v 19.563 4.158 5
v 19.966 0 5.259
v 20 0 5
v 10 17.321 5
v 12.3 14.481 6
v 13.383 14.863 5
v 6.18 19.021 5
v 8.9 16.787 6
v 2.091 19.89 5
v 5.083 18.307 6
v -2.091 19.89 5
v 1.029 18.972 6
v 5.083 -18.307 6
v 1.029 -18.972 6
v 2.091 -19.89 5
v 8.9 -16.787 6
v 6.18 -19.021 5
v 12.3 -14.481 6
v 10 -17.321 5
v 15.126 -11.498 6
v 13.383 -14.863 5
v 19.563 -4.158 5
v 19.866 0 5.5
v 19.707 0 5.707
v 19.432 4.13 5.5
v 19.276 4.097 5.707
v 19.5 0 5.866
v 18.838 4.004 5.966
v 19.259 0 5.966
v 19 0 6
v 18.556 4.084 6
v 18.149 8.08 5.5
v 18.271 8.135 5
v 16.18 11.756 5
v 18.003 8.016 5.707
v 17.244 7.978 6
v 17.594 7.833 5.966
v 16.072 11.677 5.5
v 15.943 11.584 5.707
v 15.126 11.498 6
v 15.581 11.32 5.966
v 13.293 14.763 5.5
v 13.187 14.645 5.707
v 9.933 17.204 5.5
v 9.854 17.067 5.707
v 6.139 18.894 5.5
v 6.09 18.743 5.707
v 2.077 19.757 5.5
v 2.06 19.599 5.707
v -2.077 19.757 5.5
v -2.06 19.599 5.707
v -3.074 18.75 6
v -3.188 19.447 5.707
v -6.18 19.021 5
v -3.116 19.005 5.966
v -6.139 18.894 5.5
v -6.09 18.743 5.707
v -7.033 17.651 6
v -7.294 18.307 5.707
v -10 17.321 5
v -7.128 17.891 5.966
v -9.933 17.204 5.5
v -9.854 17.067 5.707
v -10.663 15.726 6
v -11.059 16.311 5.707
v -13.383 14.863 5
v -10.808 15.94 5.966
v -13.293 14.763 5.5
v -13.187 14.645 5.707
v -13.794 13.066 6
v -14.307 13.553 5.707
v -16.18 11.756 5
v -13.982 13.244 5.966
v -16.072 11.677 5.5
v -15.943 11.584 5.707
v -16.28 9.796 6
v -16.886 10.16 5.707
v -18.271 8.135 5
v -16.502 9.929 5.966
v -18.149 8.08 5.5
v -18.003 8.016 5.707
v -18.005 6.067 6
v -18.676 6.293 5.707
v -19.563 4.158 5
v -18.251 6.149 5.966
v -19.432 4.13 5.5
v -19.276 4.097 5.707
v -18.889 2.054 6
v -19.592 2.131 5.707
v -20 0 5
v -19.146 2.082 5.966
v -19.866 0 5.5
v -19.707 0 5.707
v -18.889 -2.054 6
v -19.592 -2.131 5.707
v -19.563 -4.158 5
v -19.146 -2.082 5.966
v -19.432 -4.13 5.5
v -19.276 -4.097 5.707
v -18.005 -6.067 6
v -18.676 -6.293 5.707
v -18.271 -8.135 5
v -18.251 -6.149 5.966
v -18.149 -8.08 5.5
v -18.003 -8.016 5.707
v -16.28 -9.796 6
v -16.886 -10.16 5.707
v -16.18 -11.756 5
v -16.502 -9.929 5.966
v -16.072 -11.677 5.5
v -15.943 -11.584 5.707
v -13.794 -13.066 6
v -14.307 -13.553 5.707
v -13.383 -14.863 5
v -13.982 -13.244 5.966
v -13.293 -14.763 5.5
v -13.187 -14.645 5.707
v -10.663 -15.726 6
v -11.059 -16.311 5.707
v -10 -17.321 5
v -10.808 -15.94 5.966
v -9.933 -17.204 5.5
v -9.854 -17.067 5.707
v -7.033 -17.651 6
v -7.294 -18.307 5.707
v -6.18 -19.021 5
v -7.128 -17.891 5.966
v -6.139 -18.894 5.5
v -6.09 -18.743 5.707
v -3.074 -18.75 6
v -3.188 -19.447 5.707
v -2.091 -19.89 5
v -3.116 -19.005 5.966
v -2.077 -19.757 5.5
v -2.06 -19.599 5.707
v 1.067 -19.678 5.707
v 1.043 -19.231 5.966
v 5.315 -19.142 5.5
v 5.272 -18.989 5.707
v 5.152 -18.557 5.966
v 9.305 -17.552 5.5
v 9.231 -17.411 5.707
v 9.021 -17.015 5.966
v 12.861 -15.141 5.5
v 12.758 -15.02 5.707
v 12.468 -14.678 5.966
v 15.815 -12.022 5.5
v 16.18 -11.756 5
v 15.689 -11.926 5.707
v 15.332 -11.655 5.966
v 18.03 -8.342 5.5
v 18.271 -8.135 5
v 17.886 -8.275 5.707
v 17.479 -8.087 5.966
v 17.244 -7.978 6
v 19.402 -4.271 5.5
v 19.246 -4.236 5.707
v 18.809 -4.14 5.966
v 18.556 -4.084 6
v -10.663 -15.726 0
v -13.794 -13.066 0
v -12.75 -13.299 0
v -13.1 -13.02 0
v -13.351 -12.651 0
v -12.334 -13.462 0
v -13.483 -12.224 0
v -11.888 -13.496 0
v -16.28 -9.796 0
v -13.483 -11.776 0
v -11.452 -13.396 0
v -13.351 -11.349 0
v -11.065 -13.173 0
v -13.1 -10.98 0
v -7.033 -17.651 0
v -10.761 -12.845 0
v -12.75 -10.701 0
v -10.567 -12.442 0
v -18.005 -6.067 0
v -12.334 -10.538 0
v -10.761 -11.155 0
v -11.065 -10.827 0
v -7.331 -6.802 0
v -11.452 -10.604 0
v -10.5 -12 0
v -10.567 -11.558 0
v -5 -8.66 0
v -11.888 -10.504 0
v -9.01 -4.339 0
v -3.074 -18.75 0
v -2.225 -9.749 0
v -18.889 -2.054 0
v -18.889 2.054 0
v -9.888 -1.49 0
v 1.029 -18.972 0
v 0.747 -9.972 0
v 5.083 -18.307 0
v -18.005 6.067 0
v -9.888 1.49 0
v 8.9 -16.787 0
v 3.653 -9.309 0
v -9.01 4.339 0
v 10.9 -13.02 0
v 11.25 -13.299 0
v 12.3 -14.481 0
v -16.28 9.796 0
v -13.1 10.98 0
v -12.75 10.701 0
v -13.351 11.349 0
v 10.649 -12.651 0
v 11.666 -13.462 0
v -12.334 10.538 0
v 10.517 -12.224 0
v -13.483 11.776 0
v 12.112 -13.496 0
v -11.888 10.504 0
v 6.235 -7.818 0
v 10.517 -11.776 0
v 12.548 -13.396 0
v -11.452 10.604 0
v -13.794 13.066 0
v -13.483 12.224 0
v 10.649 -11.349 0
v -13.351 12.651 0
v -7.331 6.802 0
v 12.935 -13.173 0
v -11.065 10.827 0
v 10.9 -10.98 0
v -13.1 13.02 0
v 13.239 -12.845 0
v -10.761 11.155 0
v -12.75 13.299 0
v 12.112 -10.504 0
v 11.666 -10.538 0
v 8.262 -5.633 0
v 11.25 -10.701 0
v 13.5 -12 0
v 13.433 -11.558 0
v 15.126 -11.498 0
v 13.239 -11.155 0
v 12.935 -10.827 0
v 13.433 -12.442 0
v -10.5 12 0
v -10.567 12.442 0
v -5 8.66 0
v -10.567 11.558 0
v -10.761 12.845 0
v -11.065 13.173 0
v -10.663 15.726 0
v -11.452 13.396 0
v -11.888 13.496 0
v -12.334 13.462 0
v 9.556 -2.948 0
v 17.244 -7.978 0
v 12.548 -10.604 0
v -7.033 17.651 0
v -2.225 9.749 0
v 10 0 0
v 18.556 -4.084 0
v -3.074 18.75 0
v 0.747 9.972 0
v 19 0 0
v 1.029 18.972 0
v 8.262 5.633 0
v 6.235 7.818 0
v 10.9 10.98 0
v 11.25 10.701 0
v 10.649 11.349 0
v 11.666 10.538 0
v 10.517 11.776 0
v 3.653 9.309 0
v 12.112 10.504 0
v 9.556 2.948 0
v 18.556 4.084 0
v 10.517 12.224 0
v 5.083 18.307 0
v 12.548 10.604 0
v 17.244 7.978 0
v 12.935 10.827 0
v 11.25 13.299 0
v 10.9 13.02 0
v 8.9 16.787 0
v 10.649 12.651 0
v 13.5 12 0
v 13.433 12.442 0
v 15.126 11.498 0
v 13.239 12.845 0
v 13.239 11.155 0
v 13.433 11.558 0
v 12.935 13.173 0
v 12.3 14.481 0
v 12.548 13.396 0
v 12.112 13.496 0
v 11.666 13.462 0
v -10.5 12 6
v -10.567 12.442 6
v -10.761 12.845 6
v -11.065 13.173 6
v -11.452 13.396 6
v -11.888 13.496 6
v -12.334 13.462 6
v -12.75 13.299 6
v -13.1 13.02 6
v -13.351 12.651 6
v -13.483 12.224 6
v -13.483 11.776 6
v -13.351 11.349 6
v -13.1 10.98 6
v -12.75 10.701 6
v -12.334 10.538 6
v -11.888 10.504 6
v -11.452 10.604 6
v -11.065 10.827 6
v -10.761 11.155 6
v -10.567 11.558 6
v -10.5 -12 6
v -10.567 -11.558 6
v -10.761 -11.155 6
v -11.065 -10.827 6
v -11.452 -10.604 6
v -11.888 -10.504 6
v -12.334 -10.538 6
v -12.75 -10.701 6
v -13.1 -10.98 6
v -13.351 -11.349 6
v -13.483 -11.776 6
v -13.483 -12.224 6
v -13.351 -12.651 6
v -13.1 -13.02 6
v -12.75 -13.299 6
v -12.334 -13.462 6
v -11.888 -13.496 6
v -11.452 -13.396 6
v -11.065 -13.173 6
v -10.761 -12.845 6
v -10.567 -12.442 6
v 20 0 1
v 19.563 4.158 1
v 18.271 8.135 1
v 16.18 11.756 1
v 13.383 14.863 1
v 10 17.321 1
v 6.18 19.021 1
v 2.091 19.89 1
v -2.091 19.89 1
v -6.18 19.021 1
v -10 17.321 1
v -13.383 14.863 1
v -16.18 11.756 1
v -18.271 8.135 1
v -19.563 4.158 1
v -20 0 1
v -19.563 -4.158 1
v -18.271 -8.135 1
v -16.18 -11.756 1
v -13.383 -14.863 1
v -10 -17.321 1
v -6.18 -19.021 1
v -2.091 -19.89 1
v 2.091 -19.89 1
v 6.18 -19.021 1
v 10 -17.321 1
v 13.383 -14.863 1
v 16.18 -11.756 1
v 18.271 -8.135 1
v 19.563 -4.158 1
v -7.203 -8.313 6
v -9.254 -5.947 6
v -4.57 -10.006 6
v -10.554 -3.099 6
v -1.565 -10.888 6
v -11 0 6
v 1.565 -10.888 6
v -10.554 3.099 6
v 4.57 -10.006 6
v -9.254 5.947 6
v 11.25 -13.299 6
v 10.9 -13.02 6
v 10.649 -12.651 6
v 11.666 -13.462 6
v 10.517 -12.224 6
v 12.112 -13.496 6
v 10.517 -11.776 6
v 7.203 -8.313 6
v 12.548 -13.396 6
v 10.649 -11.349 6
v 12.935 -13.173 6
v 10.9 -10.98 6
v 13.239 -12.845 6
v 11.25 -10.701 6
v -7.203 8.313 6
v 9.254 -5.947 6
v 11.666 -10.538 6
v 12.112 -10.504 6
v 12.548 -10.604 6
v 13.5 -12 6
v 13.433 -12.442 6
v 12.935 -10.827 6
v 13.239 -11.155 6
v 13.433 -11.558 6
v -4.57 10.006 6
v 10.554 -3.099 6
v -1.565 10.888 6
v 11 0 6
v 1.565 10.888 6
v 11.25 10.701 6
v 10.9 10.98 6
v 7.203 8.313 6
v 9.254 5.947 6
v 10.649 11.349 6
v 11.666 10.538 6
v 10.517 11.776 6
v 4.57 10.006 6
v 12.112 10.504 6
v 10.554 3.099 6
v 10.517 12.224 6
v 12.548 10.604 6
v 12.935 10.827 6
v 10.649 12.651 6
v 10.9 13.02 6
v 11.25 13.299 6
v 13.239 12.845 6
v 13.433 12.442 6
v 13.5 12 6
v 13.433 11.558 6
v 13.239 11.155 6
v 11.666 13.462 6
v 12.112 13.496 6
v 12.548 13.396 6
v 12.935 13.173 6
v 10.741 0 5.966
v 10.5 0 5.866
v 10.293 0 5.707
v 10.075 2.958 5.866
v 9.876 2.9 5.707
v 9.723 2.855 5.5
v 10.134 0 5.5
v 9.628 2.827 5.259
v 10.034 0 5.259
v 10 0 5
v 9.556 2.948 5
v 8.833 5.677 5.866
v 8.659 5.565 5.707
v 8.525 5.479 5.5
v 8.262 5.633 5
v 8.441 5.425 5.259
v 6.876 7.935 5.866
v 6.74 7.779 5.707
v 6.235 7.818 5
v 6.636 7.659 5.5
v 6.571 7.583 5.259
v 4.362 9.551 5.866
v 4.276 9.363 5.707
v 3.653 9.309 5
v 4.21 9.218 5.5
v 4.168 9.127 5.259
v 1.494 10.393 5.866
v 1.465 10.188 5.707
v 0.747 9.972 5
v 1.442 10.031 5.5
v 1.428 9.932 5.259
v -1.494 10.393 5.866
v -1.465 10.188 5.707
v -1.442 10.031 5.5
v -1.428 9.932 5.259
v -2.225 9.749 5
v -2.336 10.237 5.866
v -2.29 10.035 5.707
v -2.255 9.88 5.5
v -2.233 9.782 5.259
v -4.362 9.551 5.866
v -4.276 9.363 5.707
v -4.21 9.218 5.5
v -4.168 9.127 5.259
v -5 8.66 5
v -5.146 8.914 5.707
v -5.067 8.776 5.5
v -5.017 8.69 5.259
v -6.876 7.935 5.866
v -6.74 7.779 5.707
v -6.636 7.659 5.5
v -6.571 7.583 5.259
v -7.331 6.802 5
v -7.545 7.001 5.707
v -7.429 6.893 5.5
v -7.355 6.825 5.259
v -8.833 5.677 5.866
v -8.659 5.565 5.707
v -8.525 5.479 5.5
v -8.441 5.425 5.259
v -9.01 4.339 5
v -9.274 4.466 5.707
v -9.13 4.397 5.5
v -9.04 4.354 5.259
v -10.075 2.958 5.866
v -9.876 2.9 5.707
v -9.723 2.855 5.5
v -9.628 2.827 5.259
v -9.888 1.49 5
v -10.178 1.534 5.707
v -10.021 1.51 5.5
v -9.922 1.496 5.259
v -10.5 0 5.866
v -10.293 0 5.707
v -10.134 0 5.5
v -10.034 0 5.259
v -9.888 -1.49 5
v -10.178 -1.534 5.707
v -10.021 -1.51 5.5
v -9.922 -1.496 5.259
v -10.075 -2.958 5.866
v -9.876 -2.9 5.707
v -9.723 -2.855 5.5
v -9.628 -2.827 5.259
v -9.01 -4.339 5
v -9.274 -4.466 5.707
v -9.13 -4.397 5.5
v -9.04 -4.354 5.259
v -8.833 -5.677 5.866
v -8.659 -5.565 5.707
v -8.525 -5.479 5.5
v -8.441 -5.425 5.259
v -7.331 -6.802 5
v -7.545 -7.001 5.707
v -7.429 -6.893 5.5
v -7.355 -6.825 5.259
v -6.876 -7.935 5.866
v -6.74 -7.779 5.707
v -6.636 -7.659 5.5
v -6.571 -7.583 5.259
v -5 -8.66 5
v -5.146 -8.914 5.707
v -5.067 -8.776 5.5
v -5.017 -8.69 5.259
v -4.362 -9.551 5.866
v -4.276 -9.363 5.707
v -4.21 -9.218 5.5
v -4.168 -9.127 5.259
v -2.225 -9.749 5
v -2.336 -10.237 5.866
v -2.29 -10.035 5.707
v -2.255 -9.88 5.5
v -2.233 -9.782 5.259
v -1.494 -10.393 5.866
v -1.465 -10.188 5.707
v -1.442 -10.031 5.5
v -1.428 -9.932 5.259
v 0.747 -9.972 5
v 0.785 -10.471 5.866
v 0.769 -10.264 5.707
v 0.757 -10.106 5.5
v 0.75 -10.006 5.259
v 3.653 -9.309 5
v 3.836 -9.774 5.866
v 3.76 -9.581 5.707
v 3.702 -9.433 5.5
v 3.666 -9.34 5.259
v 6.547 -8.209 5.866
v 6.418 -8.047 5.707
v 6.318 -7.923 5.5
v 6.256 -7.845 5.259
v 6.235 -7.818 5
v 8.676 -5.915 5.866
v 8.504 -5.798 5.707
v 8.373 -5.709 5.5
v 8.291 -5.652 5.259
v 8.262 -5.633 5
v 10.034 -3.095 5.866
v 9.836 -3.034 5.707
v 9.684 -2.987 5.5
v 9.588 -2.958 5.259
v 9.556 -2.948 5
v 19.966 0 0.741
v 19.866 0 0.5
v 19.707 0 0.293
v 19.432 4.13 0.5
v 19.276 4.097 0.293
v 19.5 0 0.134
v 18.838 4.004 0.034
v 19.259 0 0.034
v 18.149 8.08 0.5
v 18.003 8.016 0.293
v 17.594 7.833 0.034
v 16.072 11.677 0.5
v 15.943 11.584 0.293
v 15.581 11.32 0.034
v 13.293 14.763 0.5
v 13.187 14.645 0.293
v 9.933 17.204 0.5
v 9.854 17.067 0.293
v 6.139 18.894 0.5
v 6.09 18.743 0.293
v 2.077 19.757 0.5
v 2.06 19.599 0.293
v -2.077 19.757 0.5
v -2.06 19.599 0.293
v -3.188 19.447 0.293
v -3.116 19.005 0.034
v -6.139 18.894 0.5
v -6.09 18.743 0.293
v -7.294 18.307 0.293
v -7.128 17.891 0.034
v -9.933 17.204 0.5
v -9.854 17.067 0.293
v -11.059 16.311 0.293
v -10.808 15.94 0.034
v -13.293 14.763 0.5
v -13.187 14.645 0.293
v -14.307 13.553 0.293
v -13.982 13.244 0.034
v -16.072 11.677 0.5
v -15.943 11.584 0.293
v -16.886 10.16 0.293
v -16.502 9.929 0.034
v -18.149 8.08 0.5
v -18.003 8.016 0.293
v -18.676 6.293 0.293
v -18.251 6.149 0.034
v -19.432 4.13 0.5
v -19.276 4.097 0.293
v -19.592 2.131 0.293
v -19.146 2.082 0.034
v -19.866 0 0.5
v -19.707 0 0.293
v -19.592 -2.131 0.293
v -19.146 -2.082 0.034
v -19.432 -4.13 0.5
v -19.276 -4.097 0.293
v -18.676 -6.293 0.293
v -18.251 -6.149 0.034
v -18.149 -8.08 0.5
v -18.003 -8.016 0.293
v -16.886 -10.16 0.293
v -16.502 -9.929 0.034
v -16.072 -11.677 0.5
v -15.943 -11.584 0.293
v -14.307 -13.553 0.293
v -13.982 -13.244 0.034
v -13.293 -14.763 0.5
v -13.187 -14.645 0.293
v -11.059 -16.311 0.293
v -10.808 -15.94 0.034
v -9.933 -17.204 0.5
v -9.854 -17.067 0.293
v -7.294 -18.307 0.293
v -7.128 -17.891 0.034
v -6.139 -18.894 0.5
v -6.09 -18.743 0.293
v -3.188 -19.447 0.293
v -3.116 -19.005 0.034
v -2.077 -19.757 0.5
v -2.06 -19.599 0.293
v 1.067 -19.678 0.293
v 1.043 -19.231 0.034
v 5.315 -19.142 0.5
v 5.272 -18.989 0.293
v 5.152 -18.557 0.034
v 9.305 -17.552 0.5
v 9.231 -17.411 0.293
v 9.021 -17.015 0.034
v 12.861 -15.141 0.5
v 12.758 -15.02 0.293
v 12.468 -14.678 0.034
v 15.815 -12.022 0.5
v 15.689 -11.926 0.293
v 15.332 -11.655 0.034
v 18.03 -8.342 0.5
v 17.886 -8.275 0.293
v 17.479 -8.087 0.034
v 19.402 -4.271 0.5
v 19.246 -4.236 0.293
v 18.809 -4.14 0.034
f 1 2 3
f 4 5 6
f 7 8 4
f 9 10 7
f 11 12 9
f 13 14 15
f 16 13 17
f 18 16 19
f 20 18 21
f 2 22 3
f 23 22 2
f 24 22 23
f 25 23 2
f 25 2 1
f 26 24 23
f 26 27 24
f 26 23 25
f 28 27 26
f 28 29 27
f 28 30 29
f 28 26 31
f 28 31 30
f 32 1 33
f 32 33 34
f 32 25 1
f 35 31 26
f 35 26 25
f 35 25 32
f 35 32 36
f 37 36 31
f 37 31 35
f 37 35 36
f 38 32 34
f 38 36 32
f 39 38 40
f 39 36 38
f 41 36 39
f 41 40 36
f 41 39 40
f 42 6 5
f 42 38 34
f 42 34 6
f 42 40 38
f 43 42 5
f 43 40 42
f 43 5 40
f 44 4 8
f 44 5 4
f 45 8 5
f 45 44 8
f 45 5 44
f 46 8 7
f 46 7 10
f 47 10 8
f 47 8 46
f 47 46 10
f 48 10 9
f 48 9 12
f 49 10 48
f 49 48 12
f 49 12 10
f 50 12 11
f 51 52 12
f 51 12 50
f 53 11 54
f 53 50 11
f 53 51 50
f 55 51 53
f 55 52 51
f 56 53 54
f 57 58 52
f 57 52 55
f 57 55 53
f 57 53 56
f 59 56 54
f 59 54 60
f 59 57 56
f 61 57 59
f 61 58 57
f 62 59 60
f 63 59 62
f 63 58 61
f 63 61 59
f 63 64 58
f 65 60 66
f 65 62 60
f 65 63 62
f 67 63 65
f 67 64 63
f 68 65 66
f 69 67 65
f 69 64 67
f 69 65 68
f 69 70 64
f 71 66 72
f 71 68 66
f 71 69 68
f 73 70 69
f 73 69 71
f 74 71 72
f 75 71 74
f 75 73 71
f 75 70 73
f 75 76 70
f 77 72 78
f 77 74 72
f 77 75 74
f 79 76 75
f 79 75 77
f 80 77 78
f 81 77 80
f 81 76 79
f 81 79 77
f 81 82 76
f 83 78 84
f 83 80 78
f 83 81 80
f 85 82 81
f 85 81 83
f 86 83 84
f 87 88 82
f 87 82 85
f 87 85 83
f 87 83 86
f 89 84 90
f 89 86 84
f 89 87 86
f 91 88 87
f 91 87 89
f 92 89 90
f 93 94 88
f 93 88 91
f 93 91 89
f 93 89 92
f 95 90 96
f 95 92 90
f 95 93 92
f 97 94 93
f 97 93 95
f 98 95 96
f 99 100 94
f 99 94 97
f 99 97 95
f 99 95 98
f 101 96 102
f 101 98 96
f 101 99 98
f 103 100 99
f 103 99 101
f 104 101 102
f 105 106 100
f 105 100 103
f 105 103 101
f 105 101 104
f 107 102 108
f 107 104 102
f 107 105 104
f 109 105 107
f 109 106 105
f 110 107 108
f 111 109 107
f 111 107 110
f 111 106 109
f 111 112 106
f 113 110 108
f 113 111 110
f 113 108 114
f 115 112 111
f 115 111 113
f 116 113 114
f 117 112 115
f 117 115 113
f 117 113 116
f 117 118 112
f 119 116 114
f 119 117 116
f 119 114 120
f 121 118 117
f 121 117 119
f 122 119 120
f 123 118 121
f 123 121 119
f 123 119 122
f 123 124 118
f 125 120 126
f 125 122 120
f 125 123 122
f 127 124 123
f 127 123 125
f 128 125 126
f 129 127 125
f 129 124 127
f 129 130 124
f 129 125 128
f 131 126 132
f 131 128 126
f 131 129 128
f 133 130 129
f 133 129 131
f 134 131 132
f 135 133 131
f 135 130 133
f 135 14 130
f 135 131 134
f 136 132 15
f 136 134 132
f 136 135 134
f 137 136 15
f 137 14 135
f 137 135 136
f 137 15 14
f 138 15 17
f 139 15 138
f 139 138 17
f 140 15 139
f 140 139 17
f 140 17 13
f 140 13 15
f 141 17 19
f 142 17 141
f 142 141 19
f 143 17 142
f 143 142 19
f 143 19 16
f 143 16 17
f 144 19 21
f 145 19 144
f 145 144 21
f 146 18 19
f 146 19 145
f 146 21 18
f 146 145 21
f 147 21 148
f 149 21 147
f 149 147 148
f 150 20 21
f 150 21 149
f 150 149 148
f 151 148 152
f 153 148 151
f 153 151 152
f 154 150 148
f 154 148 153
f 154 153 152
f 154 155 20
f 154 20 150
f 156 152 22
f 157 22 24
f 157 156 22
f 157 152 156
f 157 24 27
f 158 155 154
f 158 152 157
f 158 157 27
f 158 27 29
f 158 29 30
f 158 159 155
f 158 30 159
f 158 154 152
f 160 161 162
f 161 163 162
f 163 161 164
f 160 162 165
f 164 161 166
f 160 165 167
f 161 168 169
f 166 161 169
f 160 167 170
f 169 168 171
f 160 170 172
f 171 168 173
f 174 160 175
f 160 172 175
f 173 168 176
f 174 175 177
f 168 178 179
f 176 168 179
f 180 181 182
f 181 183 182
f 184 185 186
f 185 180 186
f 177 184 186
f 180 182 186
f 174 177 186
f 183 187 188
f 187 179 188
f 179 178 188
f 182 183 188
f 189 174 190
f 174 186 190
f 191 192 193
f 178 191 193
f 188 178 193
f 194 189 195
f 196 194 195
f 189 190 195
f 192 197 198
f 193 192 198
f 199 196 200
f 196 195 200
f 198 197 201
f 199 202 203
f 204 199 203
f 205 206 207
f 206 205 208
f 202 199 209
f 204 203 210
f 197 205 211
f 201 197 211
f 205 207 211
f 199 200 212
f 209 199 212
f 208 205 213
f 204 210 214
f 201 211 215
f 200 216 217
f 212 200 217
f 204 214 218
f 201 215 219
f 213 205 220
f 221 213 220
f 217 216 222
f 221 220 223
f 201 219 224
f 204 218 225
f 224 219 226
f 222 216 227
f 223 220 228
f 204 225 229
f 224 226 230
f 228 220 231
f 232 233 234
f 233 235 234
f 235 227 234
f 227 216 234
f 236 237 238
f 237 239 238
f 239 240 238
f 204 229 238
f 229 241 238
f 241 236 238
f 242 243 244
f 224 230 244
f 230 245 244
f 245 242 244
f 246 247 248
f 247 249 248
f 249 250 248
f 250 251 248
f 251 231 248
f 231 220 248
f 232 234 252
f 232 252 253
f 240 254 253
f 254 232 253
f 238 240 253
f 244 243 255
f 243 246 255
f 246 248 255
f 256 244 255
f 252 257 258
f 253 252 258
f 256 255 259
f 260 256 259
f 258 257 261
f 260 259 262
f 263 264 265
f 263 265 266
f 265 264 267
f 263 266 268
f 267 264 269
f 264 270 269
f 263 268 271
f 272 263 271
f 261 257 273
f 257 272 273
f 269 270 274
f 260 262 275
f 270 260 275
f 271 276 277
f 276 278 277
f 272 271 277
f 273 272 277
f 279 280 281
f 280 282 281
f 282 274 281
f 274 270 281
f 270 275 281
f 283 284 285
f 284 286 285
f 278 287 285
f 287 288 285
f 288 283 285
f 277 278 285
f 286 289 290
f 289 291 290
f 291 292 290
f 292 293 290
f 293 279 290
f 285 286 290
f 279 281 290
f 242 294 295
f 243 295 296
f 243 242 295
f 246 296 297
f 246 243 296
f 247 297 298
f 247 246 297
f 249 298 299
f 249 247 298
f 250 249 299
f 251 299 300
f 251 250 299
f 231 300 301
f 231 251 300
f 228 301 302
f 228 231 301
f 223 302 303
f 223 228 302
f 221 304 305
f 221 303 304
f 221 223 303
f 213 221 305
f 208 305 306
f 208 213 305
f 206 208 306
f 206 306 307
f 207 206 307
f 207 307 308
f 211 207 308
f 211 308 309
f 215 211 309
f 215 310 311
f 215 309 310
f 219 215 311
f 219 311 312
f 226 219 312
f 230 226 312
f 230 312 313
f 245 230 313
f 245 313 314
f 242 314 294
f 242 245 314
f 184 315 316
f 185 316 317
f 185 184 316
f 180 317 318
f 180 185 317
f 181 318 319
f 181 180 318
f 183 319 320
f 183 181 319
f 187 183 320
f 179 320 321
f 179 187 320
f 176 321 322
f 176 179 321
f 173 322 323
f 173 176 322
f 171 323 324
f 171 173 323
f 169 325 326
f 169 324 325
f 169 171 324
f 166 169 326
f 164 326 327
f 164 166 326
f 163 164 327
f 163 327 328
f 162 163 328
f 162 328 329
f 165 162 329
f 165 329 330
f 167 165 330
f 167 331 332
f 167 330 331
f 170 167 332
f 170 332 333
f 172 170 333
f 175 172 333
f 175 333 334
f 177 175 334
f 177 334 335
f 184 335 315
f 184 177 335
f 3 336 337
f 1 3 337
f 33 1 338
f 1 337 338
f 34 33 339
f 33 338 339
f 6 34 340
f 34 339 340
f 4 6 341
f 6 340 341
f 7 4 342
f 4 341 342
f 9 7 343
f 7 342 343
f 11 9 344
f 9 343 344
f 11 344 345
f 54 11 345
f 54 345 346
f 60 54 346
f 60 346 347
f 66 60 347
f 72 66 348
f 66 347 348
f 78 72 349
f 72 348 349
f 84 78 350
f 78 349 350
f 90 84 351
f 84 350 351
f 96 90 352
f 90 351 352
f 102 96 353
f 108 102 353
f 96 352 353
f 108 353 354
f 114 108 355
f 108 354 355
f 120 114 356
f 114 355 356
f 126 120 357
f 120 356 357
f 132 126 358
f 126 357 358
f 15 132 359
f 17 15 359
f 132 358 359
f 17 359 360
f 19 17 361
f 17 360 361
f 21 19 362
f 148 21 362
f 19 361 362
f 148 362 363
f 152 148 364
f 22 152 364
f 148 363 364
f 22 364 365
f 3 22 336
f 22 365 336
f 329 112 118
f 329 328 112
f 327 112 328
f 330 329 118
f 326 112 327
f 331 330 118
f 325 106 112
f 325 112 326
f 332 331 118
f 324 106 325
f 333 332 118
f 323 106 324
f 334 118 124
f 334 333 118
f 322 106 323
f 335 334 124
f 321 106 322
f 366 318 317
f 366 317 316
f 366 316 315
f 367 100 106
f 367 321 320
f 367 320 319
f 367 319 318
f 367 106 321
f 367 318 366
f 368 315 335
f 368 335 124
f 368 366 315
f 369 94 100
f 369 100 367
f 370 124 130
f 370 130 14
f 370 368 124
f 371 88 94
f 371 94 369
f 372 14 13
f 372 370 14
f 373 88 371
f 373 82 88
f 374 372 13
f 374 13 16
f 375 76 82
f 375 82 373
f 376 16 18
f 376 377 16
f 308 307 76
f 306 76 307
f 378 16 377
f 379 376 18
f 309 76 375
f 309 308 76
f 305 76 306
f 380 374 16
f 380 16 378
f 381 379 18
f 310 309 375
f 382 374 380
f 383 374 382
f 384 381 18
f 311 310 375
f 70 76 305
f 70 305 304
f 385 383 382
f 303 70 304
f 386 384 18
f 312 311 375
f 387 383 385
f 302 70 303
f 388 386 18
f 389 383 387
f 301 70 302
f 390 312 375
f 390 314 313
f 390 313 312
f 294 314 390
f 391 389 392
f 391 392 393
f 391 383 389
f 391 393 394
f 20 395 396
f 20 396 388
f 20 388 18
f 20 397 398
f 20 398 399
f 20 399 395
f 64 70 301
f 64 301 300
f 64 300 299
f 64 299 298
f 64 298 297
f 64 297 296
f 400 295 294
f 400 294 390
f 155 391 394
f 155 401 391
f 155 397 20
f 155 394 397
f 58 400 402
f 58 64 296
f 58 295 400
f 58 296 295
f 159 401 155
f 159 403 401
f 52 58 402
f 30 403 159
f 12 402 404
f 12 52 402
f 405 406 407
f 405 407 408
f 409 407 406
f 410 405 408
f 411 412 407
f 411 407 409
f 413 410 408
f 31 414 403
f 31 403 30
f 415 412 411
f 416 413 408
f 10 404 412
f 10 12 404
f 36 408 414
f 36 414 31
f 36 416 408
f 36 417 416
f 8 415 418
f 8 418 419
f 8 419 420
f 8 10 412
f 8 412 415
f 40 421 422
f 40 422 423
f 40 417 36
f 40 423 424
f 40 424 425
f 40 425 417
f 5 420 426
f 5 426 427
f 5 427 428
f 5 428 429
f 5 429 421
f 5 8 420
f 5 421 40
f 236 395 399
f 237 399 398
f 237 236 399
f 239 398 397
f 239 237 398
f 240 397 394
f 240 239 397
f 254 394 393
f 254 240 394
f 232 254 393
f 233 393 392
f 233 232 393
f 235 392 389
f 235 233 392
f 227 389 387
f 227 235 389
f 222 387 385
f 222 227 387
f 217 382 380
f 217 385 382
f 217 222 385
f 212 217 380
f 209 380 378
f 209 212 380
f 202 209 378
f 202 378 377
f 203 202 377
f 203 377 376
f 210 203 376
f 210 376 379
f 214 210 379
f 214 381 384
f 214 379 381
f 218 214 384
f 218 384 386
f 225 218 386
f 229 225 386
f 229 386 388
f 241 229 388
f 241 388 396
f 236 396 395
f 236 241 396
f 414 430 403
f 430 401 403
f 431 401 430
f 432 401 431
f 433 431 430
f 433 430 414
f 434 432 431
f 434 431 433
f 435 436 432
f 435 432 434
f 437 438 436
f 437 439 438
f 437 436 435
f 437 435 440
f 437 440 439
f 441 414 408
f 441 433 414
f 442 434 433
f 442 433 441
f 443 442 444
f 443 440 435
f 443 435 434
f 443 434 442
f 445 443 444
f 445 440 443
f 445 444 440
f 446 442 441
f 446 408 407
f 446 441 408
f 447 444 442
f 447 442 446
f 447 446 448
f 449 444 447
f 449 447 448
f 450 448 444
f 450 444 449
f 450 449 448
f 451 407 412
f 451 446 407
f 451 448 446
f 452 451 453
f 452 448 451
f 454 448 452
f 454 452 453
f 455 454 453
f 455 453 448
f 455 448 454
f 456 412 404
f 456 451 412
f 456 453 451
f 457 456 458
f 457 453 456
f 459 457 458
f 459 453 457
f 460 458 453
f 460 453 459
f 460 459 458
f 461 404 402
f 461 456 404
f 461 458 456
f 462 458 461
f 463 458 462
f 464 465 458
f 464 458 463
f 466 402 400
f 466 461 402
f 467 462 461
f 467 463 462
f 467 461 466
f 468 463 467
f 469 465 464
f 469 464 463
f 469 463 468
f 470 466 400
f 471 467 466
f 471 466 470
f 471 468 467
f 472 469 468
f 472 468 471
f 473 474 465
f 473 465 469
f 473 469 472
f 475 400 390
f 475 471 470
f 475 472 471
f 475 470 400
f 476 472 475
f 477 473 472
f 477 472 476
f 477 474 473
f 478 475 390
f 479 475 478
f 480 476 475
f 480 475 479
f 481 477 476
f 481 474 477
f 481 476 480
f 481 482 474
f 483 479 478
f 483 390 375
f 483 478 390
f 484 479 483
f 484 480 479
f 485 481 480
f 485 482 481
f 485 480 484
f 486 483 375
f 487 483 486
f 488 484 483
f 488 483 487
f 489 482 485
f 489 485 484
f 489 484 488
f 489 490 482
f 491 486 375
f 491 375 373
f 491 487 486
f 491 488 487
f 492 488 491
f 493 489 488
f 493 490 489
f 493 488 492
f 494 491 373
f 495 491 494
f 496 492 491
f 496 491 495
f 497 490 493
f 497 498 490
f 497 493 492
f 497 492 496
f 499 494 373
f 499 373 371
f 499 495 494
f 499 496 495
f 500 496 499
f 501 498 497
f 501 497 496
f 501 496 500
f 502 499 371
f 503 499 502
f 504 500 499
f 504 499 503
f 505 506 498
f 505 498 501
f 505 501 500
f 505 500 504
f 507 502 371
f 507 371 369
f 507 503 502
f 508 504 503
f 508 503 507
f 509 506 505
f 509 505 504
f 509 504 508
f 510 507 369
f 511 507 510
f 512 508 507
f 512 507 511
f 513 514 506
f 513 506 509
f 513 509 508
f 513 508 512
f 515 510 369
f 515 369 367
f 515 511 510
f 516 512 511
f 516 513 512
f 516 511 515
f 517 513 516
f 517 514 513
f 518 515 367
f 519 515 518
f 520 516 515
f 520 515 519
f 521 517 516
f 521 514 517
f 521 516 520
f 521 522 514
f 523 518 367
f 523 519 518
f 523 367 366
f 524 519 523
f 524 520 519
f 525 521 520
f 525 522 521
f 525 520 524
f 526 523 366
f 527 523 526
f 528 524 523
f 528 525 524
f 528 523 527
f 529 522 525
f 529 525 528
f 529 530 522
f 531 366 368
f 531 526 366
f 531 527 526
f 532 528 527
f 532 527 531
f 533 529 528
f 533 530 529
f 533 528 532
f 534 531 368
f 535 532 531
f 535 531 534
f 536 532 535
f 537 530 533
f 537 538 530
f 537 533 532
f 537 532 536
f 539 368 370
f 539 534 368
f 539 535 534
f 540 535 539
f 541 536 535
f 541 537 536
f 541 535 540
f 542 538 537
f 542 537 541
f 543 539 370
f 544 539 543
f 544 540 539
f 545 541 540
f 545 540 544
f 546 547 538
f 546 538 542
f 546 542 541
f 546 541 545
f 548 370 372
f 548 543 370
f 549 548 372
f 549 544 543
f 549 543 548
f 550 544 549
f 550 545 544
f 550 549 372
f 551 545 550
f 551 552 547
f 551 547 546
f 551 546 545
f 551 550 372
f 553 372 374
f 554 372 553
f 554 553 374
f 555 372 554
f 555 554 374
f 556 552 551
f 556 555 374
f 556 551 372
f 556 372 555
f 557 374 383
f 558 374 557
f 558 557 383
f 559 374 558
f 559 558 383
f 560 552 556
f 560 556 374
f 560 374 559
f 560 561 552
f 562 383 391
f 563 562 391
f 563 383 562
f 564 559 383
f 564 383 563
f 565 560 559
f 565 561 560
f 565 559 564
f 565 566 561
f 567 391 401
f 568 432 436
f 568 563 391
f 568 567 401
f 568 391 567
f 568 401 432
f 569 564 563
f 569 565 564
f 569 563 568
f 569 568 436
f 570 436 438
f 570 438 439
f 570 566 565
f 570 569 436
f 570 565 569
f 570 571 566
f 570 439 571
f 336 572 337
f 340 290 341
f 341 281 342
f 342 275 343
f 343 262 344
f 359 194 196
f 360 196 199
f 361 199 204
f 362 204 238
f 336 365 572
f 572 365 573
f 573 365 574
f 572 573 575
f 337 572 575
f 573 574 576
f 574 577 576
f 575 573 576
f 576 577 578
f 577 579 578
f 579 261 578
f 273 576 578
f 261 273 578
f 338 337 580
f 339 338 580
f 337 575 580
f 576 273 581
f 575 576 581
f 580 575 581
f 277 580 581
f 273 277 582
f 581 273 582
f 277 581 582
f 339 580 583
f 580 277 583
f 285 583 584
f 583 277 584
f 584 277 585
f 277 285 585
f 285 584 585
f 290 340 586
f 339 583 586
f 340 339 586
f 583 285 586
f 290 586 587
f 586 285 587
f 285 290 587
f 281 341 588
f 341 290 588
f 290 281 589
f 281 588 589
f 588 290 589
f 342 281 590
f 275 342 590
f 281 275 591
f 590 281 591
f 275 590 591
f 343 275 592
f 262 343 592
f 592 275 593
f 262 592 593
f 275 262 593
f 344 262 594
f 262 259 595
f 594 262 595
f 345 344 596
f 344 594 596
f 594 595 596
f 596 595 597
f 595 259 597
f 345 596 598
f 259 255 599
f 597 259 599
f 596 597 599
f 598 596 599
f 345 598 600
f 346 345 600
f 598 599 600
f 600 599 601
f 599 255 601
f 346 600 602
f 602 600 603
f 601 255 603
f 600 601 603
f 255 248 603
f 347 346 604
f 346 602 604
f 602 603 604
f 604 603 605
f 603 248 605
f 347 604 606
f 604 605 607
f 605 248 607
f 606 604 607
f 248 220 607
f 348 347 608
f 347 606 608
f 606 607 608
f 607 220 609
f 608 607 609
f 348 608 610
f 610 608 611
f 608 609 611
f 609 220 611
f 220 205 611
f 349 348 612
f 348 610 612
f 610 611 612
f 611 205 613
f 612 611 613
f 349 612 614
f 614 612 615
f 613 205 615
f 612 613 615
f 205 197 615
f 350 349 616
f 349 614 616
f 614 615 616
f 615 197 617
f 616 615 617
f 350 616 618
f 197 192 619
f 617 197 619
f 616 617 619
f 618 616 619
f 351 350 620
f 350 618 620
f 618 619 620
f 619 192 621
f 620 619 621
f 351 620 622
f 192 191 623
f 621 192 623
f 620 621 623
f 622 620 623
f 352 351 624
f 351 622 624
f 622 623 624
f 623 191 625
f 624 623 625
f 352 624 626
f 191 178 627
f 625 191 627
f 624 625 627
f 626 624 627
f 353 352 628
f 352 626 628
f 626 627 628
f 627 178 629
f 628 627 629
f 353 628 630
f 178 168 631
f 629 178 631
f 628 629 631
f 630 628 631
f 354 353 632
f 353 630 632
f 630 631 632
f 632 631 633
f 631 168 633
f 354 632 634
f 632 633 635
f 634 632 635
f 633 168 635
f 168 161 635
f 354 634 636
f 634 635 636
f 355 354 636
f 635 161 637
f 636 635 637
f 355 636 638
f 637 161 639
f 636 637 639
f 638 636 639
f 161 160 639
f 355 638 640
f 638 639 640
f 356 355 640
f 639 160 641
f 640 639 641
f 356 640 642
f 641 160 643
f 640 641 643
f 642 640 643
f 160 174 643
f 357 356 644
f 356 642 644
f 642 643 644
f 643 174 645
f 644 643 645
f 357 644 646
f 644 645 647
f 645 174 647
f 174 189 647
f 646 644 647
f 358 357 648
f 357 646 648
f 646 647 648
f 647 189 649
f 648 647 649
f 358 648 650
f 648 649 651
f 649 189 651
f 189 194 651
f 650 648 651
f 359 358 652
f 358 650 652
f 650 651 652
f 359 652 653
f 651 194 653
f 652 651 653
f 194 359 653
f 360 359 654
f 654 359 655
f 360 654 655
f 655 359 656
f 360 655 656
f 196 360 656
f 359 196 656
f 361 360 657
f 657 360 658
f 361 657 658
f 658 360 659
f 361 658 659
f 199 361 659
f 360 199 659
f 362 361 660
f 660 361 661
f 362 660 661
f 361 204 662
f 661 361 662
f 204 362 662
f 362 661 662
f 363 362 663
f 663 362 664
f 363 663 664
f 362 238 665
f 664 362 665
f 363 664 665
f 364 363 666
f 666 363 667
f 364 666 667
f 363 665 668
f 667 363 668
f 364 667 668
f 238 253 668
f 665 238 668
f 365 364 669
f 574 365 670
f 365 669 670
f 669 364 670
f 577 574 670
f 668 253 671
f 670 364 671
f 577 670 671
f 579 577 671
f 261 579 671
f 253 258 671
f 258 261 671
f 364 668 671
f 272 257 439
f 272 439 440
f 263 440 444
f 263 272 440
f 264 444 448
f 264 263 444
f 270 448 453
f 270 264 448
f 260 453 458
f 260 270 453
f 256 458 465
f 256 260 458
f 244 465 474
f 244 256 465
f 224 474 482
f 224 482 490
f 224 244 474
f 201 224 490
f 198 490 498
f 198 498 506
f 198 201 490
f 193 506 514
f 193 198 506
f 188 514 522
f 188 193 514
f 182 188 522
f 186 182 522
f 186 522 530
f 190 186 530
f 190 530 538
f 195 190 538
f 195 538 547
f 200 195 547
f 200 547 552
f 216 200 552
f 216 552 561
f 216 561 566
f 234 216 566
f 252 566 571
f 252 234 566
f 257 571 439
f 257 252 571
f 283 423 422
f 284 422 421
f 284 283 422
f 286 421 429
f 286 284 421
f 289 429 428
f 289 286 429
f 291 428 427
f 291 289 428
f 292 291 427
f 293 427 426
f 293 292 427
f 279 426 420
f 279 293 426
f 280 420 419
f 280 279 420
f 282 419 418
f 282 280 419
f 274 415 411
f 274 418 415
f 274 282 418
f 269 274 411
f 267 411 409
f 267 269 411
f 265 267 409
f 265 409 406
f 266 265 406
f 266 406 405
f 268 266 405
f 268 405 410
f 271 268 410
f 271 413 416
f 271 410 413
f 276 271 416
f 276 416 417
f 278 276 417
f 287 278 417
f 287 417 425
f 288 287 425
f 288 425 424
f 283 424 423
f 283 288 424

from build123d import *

# Parameters (mm, degrees)
CYLINDER019_R     = 1.5
CYLINDER019_DEPTH = 10
ARRAY_X_COUNT     = 2
ARRAY_X_PITCH     = 24
ARRAY_Y_COUNT     = 2
ARRAY_Y_PITCH     = 24
CYLINDER014_R     = 10
CYLINDER014_DEPTH = 6
CYLINDER018_R     = 20
CYLINDER018_DEPTH = 6
FILLET_R          = 1


with BuildPart() as bolt_hole_array:
    # Cylinder019 → Cylinder019 (new body)
    with BuildSketch(Plane.XY):
        Circle(CYLINDER019_R)
    extrude(amount=CYLINDER019_DEPTH)

    # Array X: bolt hole array ×2


with BuildPart() as bolt_hole_array_1:
    add(bolt_hole_array.part)
    with Locations(*[(i * ARRAY_X_PITCH, 0, 0) for i in range(1, ARRAY_X_COUNT)]):
        add(bolt_hole_array.part)

    # Array Y: bolt hole array ×2


with BuildPart() as bolt_hole_array_2:
    add(bolt_hole_array_1.part)
    with Locations(*[(0, i * ARRAY_Y_PITCH, 0) for i in range(1, ARRAY_Y_COUNT)]):
        add(bolt_hole_array_1.part)


with BuildPart() as bolt_hole_array_3:
    # Array placement: moved
    add(bolt_hole_array_2.part.moved(Location((-12, -12, 0))))


with BuildPart() as hole_fusion:
    # Cylinder014 → Cylinder014 (new body)
    with BuildSketch(Plane.XY):
        Circle(CYLINDER014_R)
    extrude(amount=CYLINDER014_DEPTH)

    # Fusion003: union bolt hole array
    add(bolt_hole_array_3.part)


with BuildPart() as fillet_body:
    # Cylinder018 → Cylinder018 (new body)
    with BuildSketch(Plane.XY):
        Circle(CYLINDER018_R)
    extrude(amount=CYLINDER018_DEPTH)

    # Cut003: cut hole fusion
    add(hole_fusion.part, mode=Mode.SUBTRACT)

    # Fillet
    fillet_edges = [fillet_body.edges().sort_by_distance(p)[0] for p in [
        (-20, 0, 6),
        (-20, 0, 0),
        (-10, 0, 6),
    ]]
    fillet(fillet_edges, radius=FILLET_R)


solid = fillet_body.part
